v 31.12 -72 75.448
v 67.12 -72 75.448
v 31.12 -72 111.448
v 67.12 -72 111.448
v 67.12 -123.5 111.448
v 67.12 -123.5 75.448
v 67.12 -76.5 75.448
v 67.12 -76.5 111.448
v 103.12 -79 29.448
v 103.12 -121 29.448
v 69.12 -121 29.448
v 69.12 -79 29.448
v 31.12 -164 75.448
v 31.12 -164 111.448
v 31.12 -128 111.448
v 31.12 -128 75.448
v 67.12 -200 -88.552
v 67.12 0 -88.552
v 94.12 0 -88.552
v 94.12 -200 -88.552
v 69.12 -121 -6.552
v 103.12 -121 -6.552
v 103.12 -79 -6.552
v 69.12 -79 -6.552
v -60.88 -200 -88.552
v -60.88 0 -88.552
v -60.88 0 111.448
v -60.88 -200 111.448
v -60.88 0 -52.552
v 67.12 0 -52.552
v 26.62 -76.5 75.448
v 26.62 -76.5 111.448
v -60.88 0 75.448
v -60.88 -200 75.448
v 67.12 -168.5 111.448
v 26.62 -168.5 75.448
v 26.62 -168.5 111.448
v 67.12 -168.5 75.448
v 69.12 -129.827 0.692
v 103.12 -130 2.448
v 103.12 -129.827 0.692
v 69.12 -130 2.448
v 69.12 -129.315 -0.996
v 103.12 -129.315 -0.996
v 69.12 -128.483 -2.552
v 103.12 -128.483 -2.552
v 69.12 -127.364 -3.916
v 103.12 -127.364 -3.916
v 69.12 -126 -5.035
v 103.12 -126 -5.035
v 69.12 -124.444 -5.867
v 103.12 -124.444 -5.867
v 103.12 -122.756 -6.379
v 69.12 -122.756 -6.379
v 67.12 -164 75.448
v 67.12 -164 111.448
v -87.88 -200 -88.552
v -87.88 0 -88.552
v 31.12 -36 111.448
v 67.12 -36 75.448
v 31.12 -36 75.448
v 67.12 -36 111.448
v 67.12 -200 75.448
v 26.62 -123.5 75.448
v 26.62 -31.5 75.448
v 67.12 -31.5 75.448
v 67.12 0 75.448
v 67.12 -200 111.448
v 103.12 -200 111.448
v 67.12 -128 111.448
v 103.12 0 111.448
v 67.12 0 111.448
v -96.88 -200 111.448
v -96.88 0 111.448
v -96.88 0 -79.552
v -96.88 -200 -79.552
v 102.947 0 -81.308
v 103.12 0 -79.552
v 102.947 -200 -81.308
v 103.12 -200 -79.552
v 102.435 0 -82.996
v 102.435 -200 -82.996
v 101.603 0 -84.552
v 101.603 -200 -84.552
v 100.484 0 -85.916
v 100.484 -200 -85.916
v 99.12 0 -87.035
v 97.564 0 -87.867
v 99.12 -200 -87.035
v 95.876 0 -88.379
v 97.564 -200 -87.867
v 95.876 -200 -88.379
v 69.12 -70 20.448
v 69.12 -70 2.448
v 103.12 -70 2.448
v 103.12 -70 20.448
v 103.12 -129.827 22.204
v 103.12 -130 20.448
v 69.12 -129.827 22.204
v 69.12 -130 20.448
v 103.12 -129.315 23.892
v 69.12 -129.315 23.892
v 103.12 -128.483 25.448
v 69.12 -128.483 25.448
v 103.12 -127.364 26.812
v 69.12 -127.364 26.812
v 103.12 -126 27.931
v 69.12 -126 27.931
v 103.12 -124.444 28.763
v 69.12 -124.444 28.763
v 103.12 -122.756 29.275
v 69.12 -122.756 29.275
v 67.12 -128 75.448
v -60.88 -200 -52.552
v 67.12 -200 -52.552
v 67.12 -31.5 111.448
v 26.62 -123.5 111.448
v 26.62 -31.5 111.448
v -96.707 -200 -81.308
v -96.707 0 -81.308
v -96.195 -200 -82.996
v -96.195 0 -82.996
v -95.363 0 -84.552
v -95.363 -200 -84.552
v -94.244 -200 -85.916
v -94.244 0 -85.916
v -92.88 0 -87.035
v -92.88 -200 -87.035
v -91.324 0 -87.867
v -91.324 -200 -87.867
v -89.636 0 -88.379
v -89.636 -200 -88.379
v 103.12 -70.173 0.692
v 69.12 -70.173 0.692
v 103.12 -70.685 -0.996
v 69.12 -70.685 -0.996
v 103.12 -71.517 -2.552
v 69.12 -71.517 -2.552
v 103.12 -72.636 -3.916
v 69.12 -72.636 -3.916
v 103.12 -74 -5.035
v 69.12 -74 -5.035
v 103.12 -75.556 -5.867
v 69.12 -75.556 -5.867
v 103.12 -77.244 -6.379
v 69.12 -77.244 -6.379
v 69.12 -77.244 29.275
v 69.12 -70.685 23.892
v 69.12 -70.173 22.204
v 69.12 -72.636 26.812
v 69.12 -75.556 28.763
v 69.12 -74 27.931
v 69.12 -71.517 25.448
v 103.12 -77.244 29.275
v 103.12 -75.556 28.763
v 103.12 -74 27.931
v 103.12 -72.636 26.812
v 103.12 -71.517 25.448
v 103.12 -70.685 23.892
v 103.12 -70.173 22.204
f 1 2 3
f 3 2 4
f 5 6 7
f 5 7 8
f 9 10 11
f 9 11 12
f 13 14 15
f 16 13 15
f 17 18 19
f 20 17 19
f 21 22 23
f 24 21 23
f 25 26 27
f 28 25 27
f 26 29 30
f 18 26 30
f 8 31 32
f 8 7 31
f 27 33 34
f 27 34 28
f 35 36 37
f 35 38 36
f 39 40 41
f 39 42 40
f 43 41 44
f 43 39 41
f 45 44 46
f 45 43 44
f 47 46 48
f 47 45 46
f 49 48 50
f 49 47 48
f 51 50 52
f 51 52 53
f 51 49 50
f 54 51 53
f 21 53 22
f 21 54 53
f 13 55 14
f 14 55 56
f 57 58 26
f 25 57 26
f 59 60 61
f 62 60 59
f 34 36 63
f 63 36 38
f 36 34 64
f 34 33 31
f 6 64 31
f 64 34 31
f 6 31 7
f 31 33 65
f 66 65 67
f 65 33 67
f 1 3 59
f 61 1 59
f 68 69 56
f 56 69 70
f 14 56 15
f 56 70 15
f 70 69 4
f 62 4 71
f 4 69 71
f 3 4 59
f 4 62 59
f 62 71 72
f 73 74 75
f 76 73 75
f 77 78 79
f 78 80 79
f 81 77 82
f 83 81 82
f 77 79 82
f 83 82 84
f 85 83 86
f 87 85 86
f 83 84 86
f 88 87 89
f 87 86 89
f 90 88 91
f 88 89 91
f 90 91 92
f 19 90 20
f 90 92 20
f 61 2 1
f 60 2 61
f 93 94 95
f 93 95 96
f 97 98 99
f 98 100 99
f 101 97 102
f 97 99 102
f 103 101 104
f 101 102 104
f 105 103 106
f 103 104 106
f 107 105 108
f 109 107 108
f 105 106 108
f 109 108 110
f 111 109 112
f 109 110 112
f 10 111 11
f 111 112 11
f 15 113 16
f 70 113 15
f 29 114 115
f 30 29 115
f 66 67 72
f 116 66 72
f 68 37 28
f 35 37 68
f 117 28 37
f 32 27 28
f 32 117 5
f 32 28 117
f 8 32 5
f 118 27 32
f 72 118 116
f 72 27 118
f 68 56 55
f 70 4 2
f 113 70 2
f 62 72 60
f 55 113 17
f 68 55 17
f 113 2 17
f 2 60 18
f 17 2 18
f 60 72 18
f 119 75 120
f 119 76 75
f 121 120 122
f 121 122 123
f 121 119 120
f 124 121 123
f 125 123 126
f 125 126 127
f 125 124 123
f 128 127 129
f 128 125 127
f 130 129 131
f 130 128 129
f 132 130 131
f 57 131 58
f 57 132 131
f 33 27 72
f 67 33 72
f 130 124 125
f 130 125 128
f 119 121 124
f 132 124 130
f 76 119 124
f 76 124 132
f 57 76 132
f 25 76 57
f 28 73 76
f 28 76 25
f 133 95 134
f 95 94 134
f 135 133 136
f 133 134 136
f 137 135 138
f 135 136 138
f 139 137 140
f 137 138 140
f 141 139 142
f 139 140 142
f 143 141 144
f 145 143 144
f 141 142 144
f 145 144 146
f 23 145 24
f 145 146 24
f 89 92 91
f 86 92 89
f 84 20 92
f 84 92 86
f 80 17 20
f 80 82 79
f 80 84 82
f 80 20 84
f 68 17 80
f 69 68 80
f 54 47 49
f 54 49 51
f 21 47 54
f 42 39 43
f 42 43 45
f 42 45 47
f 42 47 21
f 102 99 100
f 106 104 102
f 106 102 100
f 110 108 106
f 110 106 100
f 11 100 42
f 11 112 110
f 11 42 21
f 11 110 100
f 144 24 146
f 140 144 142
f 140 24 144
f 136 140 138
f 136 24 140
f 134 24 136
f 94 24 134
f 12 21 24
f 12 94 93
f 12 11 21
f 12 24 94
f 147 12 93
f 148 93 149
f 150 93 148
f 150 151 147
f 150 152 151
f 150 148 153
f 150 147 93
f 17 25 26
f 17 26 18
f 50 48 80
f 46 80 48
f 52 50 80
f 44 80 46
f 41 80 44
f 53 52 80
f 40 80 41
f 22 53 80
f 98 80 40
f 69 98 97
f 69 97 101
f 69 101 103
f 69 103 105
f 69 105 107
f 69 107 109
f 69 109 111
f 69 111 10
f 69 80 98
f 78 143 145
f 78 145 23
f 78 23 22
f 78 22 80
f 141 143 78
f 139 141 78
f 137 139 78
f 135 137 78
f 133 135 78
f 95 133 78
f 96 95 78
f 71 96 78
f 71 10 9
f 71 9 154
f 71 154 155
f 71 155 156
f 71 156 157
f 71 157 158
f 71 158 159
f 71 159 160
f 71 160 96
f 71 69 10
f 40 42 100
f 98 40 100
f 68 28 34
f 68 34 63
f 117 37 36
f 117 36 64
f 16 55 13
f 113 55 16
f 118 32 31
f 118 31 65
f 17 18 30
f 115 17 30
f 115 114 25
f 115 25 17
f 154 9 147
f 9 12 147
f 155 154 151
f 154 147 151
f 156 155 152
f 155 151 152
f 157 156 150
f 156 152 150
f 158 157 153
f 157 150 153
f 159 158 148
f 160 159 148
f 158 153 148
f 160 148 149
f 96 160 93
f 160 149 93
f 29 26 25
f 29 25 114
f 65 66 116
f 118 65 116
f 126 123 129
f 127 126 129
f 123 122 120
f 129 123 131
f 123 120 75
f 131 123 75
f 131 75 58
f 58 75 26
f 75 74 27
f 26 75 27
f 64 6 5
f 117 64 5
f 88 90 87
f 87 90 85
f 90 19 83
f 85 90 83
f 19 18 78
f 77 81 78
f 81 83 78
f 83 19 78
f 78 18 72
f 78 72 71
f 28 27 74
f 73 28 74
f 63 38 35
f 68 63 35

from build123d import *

# Parameters (mm, degrees)
F2_DEPTH  = 200
F1_W      = 128
F1_H      = 36
F3_DEPTH  = 200
F4_W      = 60
F4_H      = 36
F5_DEPTH  = 34
F6_R      = 9
F7_W      = 36
F7_H      = 36
F8_DEPTH  = 72
F9_OFFSET = 4.5
F10_DEPTH = 72
F11_R     = 9
F11_2_R   = 9


with BuildPart() as f2:
    # F1 (on Front) → F2 (new body)
    with BuildSketch(Plane.XZ):
        Polygon((-60.879735278, 111.4477722661), (-96.879735278, 111.4477722661), (-96.879735278, -88.5522277339), (-60.879735278, -88.5522277339), (-60.879735278, -52.5522277339), (-60.879735278, 75.4477722661), align=None)
    extrude(amount=F2_DEPTH)

    # F11#2
    f11_2_edges = [f2.edges().sort_by_distance(p)[0] for p in [
        (-96.879735, -100, -88.552228),
    ]]
    fillet(f11_2_edges, radius=F11_2_R)


with BuildPart() as f2b:
    # F1 (on Front) → F2, piece 2 (new body)
    with BuildSketch(Plane.XZ):
        Polygon((103.120264722, 111.4477722661), (67.120264722, 111.4477722661), (67.120264722, 75.4477722661), (67.120264722, -52.5522277339), (67.120264722, -88.5522277339), (103.120264722, -88.5522277339), align=None)
    extrude(amount=F2_DEPTH)

    # F4 (on face) → F5 (cut)
    with BuildSketch(Plane.YZ.offset(103.120264722)):
        with Locations((-100, 11.4477722661)):
            Rectangle(F4_W, F4_H)
    extrude(amount=-F5_DEPTH, mode=Mode.SUBTRACT)

    # F6
    f6_edges = [f2b.edges().sort_by_distance(p)[0] for p in [
        (86.120265, -130, 29.447772),
        (86.120265, -70, 29.447772),
        (86.120265, -70, -6.552228),
        (86.120265, -130, -6.552228),
    ]]
    fillet(f6_edges, radius=F6_R)

    # F7 (on face) → F10 (join)
    with BuildSketch(Plane.YZ.offset(103.120264722)):
        with Locations((-146, 93.4477722661)):
            Rectangle(F7_W, F7_H)
        with Locations((-54, 93.4477722661)):
            Rectangle(F7_W, F7_H)
    extrude(amount=-F10_DEPTH)

    # F11
    f11_edges = [f2b.edges().sort_by_distance(p)[0] for p in [
        (103.120265, -100, -88.552228),
    ]]
    fillet(f11_edges, radius=F11_R)


with BuildPart() as f3:
    # F1 (on Front) → F3 (new body)
    with BuildSketch(Plane.XZ):
        with Locations((3.120264722, 93.4477722661)):
            Rectangle(F1_W, F1_H)
    extrude(amount=F3_DEPTH)


with BuildPart() as f3b:
    # F1 (on Front) → F3, piece 2 (new body)
    with BuildSketch(Plane.XZ):
        with Locations((3.120264722, -70.5522277339)):
            Rectangle(F1_W, F1_H)
    extrude(amount=F3_DEPTH)


with BuildPart() as f8:
    # F7 (on face) → F8 (new body)
    with BuildSketch(Plane.YZ.offset(103.120264722)):
        with Locations((-54, 93.4477722661)):
            Rectangle(F7_W, F7_H)
    extrude(amount=-F8_DEPTH)


with BuildPart() as f8b:
    # F7 (on face) → F8, piece 2 (new body)
    with BuildSketch(Plane.YZ.offset(103.120264722)):
        with Locations((-146, 93.4477722661)):
            Rectangle(F7_W, F7_H)
    extrude(amount=-F8_DEPTH)


with BuildPart() as f3_1:
    add(f3.part)

    # F9: cut F8b, F8, each made larger all round first
    f9_tool = offset(f8b.part, amount=F9_OFFSET, kind=Kind.INTERSECTION, mode=Mode.PRIVATE)
    add(f9_tool, mode=Mode.SUBTRACT)
    f9_tool1 = offset(f8.part, amount=F9_OFFSET, kind=Kind.INTERSECTION, mode=Mode.PRIVATE)
    add(f9_tool1, mode=Mode.SUBTRACT)


solid = Compound([f2.part, f2b.part, f3b.part, f3_1.part])
